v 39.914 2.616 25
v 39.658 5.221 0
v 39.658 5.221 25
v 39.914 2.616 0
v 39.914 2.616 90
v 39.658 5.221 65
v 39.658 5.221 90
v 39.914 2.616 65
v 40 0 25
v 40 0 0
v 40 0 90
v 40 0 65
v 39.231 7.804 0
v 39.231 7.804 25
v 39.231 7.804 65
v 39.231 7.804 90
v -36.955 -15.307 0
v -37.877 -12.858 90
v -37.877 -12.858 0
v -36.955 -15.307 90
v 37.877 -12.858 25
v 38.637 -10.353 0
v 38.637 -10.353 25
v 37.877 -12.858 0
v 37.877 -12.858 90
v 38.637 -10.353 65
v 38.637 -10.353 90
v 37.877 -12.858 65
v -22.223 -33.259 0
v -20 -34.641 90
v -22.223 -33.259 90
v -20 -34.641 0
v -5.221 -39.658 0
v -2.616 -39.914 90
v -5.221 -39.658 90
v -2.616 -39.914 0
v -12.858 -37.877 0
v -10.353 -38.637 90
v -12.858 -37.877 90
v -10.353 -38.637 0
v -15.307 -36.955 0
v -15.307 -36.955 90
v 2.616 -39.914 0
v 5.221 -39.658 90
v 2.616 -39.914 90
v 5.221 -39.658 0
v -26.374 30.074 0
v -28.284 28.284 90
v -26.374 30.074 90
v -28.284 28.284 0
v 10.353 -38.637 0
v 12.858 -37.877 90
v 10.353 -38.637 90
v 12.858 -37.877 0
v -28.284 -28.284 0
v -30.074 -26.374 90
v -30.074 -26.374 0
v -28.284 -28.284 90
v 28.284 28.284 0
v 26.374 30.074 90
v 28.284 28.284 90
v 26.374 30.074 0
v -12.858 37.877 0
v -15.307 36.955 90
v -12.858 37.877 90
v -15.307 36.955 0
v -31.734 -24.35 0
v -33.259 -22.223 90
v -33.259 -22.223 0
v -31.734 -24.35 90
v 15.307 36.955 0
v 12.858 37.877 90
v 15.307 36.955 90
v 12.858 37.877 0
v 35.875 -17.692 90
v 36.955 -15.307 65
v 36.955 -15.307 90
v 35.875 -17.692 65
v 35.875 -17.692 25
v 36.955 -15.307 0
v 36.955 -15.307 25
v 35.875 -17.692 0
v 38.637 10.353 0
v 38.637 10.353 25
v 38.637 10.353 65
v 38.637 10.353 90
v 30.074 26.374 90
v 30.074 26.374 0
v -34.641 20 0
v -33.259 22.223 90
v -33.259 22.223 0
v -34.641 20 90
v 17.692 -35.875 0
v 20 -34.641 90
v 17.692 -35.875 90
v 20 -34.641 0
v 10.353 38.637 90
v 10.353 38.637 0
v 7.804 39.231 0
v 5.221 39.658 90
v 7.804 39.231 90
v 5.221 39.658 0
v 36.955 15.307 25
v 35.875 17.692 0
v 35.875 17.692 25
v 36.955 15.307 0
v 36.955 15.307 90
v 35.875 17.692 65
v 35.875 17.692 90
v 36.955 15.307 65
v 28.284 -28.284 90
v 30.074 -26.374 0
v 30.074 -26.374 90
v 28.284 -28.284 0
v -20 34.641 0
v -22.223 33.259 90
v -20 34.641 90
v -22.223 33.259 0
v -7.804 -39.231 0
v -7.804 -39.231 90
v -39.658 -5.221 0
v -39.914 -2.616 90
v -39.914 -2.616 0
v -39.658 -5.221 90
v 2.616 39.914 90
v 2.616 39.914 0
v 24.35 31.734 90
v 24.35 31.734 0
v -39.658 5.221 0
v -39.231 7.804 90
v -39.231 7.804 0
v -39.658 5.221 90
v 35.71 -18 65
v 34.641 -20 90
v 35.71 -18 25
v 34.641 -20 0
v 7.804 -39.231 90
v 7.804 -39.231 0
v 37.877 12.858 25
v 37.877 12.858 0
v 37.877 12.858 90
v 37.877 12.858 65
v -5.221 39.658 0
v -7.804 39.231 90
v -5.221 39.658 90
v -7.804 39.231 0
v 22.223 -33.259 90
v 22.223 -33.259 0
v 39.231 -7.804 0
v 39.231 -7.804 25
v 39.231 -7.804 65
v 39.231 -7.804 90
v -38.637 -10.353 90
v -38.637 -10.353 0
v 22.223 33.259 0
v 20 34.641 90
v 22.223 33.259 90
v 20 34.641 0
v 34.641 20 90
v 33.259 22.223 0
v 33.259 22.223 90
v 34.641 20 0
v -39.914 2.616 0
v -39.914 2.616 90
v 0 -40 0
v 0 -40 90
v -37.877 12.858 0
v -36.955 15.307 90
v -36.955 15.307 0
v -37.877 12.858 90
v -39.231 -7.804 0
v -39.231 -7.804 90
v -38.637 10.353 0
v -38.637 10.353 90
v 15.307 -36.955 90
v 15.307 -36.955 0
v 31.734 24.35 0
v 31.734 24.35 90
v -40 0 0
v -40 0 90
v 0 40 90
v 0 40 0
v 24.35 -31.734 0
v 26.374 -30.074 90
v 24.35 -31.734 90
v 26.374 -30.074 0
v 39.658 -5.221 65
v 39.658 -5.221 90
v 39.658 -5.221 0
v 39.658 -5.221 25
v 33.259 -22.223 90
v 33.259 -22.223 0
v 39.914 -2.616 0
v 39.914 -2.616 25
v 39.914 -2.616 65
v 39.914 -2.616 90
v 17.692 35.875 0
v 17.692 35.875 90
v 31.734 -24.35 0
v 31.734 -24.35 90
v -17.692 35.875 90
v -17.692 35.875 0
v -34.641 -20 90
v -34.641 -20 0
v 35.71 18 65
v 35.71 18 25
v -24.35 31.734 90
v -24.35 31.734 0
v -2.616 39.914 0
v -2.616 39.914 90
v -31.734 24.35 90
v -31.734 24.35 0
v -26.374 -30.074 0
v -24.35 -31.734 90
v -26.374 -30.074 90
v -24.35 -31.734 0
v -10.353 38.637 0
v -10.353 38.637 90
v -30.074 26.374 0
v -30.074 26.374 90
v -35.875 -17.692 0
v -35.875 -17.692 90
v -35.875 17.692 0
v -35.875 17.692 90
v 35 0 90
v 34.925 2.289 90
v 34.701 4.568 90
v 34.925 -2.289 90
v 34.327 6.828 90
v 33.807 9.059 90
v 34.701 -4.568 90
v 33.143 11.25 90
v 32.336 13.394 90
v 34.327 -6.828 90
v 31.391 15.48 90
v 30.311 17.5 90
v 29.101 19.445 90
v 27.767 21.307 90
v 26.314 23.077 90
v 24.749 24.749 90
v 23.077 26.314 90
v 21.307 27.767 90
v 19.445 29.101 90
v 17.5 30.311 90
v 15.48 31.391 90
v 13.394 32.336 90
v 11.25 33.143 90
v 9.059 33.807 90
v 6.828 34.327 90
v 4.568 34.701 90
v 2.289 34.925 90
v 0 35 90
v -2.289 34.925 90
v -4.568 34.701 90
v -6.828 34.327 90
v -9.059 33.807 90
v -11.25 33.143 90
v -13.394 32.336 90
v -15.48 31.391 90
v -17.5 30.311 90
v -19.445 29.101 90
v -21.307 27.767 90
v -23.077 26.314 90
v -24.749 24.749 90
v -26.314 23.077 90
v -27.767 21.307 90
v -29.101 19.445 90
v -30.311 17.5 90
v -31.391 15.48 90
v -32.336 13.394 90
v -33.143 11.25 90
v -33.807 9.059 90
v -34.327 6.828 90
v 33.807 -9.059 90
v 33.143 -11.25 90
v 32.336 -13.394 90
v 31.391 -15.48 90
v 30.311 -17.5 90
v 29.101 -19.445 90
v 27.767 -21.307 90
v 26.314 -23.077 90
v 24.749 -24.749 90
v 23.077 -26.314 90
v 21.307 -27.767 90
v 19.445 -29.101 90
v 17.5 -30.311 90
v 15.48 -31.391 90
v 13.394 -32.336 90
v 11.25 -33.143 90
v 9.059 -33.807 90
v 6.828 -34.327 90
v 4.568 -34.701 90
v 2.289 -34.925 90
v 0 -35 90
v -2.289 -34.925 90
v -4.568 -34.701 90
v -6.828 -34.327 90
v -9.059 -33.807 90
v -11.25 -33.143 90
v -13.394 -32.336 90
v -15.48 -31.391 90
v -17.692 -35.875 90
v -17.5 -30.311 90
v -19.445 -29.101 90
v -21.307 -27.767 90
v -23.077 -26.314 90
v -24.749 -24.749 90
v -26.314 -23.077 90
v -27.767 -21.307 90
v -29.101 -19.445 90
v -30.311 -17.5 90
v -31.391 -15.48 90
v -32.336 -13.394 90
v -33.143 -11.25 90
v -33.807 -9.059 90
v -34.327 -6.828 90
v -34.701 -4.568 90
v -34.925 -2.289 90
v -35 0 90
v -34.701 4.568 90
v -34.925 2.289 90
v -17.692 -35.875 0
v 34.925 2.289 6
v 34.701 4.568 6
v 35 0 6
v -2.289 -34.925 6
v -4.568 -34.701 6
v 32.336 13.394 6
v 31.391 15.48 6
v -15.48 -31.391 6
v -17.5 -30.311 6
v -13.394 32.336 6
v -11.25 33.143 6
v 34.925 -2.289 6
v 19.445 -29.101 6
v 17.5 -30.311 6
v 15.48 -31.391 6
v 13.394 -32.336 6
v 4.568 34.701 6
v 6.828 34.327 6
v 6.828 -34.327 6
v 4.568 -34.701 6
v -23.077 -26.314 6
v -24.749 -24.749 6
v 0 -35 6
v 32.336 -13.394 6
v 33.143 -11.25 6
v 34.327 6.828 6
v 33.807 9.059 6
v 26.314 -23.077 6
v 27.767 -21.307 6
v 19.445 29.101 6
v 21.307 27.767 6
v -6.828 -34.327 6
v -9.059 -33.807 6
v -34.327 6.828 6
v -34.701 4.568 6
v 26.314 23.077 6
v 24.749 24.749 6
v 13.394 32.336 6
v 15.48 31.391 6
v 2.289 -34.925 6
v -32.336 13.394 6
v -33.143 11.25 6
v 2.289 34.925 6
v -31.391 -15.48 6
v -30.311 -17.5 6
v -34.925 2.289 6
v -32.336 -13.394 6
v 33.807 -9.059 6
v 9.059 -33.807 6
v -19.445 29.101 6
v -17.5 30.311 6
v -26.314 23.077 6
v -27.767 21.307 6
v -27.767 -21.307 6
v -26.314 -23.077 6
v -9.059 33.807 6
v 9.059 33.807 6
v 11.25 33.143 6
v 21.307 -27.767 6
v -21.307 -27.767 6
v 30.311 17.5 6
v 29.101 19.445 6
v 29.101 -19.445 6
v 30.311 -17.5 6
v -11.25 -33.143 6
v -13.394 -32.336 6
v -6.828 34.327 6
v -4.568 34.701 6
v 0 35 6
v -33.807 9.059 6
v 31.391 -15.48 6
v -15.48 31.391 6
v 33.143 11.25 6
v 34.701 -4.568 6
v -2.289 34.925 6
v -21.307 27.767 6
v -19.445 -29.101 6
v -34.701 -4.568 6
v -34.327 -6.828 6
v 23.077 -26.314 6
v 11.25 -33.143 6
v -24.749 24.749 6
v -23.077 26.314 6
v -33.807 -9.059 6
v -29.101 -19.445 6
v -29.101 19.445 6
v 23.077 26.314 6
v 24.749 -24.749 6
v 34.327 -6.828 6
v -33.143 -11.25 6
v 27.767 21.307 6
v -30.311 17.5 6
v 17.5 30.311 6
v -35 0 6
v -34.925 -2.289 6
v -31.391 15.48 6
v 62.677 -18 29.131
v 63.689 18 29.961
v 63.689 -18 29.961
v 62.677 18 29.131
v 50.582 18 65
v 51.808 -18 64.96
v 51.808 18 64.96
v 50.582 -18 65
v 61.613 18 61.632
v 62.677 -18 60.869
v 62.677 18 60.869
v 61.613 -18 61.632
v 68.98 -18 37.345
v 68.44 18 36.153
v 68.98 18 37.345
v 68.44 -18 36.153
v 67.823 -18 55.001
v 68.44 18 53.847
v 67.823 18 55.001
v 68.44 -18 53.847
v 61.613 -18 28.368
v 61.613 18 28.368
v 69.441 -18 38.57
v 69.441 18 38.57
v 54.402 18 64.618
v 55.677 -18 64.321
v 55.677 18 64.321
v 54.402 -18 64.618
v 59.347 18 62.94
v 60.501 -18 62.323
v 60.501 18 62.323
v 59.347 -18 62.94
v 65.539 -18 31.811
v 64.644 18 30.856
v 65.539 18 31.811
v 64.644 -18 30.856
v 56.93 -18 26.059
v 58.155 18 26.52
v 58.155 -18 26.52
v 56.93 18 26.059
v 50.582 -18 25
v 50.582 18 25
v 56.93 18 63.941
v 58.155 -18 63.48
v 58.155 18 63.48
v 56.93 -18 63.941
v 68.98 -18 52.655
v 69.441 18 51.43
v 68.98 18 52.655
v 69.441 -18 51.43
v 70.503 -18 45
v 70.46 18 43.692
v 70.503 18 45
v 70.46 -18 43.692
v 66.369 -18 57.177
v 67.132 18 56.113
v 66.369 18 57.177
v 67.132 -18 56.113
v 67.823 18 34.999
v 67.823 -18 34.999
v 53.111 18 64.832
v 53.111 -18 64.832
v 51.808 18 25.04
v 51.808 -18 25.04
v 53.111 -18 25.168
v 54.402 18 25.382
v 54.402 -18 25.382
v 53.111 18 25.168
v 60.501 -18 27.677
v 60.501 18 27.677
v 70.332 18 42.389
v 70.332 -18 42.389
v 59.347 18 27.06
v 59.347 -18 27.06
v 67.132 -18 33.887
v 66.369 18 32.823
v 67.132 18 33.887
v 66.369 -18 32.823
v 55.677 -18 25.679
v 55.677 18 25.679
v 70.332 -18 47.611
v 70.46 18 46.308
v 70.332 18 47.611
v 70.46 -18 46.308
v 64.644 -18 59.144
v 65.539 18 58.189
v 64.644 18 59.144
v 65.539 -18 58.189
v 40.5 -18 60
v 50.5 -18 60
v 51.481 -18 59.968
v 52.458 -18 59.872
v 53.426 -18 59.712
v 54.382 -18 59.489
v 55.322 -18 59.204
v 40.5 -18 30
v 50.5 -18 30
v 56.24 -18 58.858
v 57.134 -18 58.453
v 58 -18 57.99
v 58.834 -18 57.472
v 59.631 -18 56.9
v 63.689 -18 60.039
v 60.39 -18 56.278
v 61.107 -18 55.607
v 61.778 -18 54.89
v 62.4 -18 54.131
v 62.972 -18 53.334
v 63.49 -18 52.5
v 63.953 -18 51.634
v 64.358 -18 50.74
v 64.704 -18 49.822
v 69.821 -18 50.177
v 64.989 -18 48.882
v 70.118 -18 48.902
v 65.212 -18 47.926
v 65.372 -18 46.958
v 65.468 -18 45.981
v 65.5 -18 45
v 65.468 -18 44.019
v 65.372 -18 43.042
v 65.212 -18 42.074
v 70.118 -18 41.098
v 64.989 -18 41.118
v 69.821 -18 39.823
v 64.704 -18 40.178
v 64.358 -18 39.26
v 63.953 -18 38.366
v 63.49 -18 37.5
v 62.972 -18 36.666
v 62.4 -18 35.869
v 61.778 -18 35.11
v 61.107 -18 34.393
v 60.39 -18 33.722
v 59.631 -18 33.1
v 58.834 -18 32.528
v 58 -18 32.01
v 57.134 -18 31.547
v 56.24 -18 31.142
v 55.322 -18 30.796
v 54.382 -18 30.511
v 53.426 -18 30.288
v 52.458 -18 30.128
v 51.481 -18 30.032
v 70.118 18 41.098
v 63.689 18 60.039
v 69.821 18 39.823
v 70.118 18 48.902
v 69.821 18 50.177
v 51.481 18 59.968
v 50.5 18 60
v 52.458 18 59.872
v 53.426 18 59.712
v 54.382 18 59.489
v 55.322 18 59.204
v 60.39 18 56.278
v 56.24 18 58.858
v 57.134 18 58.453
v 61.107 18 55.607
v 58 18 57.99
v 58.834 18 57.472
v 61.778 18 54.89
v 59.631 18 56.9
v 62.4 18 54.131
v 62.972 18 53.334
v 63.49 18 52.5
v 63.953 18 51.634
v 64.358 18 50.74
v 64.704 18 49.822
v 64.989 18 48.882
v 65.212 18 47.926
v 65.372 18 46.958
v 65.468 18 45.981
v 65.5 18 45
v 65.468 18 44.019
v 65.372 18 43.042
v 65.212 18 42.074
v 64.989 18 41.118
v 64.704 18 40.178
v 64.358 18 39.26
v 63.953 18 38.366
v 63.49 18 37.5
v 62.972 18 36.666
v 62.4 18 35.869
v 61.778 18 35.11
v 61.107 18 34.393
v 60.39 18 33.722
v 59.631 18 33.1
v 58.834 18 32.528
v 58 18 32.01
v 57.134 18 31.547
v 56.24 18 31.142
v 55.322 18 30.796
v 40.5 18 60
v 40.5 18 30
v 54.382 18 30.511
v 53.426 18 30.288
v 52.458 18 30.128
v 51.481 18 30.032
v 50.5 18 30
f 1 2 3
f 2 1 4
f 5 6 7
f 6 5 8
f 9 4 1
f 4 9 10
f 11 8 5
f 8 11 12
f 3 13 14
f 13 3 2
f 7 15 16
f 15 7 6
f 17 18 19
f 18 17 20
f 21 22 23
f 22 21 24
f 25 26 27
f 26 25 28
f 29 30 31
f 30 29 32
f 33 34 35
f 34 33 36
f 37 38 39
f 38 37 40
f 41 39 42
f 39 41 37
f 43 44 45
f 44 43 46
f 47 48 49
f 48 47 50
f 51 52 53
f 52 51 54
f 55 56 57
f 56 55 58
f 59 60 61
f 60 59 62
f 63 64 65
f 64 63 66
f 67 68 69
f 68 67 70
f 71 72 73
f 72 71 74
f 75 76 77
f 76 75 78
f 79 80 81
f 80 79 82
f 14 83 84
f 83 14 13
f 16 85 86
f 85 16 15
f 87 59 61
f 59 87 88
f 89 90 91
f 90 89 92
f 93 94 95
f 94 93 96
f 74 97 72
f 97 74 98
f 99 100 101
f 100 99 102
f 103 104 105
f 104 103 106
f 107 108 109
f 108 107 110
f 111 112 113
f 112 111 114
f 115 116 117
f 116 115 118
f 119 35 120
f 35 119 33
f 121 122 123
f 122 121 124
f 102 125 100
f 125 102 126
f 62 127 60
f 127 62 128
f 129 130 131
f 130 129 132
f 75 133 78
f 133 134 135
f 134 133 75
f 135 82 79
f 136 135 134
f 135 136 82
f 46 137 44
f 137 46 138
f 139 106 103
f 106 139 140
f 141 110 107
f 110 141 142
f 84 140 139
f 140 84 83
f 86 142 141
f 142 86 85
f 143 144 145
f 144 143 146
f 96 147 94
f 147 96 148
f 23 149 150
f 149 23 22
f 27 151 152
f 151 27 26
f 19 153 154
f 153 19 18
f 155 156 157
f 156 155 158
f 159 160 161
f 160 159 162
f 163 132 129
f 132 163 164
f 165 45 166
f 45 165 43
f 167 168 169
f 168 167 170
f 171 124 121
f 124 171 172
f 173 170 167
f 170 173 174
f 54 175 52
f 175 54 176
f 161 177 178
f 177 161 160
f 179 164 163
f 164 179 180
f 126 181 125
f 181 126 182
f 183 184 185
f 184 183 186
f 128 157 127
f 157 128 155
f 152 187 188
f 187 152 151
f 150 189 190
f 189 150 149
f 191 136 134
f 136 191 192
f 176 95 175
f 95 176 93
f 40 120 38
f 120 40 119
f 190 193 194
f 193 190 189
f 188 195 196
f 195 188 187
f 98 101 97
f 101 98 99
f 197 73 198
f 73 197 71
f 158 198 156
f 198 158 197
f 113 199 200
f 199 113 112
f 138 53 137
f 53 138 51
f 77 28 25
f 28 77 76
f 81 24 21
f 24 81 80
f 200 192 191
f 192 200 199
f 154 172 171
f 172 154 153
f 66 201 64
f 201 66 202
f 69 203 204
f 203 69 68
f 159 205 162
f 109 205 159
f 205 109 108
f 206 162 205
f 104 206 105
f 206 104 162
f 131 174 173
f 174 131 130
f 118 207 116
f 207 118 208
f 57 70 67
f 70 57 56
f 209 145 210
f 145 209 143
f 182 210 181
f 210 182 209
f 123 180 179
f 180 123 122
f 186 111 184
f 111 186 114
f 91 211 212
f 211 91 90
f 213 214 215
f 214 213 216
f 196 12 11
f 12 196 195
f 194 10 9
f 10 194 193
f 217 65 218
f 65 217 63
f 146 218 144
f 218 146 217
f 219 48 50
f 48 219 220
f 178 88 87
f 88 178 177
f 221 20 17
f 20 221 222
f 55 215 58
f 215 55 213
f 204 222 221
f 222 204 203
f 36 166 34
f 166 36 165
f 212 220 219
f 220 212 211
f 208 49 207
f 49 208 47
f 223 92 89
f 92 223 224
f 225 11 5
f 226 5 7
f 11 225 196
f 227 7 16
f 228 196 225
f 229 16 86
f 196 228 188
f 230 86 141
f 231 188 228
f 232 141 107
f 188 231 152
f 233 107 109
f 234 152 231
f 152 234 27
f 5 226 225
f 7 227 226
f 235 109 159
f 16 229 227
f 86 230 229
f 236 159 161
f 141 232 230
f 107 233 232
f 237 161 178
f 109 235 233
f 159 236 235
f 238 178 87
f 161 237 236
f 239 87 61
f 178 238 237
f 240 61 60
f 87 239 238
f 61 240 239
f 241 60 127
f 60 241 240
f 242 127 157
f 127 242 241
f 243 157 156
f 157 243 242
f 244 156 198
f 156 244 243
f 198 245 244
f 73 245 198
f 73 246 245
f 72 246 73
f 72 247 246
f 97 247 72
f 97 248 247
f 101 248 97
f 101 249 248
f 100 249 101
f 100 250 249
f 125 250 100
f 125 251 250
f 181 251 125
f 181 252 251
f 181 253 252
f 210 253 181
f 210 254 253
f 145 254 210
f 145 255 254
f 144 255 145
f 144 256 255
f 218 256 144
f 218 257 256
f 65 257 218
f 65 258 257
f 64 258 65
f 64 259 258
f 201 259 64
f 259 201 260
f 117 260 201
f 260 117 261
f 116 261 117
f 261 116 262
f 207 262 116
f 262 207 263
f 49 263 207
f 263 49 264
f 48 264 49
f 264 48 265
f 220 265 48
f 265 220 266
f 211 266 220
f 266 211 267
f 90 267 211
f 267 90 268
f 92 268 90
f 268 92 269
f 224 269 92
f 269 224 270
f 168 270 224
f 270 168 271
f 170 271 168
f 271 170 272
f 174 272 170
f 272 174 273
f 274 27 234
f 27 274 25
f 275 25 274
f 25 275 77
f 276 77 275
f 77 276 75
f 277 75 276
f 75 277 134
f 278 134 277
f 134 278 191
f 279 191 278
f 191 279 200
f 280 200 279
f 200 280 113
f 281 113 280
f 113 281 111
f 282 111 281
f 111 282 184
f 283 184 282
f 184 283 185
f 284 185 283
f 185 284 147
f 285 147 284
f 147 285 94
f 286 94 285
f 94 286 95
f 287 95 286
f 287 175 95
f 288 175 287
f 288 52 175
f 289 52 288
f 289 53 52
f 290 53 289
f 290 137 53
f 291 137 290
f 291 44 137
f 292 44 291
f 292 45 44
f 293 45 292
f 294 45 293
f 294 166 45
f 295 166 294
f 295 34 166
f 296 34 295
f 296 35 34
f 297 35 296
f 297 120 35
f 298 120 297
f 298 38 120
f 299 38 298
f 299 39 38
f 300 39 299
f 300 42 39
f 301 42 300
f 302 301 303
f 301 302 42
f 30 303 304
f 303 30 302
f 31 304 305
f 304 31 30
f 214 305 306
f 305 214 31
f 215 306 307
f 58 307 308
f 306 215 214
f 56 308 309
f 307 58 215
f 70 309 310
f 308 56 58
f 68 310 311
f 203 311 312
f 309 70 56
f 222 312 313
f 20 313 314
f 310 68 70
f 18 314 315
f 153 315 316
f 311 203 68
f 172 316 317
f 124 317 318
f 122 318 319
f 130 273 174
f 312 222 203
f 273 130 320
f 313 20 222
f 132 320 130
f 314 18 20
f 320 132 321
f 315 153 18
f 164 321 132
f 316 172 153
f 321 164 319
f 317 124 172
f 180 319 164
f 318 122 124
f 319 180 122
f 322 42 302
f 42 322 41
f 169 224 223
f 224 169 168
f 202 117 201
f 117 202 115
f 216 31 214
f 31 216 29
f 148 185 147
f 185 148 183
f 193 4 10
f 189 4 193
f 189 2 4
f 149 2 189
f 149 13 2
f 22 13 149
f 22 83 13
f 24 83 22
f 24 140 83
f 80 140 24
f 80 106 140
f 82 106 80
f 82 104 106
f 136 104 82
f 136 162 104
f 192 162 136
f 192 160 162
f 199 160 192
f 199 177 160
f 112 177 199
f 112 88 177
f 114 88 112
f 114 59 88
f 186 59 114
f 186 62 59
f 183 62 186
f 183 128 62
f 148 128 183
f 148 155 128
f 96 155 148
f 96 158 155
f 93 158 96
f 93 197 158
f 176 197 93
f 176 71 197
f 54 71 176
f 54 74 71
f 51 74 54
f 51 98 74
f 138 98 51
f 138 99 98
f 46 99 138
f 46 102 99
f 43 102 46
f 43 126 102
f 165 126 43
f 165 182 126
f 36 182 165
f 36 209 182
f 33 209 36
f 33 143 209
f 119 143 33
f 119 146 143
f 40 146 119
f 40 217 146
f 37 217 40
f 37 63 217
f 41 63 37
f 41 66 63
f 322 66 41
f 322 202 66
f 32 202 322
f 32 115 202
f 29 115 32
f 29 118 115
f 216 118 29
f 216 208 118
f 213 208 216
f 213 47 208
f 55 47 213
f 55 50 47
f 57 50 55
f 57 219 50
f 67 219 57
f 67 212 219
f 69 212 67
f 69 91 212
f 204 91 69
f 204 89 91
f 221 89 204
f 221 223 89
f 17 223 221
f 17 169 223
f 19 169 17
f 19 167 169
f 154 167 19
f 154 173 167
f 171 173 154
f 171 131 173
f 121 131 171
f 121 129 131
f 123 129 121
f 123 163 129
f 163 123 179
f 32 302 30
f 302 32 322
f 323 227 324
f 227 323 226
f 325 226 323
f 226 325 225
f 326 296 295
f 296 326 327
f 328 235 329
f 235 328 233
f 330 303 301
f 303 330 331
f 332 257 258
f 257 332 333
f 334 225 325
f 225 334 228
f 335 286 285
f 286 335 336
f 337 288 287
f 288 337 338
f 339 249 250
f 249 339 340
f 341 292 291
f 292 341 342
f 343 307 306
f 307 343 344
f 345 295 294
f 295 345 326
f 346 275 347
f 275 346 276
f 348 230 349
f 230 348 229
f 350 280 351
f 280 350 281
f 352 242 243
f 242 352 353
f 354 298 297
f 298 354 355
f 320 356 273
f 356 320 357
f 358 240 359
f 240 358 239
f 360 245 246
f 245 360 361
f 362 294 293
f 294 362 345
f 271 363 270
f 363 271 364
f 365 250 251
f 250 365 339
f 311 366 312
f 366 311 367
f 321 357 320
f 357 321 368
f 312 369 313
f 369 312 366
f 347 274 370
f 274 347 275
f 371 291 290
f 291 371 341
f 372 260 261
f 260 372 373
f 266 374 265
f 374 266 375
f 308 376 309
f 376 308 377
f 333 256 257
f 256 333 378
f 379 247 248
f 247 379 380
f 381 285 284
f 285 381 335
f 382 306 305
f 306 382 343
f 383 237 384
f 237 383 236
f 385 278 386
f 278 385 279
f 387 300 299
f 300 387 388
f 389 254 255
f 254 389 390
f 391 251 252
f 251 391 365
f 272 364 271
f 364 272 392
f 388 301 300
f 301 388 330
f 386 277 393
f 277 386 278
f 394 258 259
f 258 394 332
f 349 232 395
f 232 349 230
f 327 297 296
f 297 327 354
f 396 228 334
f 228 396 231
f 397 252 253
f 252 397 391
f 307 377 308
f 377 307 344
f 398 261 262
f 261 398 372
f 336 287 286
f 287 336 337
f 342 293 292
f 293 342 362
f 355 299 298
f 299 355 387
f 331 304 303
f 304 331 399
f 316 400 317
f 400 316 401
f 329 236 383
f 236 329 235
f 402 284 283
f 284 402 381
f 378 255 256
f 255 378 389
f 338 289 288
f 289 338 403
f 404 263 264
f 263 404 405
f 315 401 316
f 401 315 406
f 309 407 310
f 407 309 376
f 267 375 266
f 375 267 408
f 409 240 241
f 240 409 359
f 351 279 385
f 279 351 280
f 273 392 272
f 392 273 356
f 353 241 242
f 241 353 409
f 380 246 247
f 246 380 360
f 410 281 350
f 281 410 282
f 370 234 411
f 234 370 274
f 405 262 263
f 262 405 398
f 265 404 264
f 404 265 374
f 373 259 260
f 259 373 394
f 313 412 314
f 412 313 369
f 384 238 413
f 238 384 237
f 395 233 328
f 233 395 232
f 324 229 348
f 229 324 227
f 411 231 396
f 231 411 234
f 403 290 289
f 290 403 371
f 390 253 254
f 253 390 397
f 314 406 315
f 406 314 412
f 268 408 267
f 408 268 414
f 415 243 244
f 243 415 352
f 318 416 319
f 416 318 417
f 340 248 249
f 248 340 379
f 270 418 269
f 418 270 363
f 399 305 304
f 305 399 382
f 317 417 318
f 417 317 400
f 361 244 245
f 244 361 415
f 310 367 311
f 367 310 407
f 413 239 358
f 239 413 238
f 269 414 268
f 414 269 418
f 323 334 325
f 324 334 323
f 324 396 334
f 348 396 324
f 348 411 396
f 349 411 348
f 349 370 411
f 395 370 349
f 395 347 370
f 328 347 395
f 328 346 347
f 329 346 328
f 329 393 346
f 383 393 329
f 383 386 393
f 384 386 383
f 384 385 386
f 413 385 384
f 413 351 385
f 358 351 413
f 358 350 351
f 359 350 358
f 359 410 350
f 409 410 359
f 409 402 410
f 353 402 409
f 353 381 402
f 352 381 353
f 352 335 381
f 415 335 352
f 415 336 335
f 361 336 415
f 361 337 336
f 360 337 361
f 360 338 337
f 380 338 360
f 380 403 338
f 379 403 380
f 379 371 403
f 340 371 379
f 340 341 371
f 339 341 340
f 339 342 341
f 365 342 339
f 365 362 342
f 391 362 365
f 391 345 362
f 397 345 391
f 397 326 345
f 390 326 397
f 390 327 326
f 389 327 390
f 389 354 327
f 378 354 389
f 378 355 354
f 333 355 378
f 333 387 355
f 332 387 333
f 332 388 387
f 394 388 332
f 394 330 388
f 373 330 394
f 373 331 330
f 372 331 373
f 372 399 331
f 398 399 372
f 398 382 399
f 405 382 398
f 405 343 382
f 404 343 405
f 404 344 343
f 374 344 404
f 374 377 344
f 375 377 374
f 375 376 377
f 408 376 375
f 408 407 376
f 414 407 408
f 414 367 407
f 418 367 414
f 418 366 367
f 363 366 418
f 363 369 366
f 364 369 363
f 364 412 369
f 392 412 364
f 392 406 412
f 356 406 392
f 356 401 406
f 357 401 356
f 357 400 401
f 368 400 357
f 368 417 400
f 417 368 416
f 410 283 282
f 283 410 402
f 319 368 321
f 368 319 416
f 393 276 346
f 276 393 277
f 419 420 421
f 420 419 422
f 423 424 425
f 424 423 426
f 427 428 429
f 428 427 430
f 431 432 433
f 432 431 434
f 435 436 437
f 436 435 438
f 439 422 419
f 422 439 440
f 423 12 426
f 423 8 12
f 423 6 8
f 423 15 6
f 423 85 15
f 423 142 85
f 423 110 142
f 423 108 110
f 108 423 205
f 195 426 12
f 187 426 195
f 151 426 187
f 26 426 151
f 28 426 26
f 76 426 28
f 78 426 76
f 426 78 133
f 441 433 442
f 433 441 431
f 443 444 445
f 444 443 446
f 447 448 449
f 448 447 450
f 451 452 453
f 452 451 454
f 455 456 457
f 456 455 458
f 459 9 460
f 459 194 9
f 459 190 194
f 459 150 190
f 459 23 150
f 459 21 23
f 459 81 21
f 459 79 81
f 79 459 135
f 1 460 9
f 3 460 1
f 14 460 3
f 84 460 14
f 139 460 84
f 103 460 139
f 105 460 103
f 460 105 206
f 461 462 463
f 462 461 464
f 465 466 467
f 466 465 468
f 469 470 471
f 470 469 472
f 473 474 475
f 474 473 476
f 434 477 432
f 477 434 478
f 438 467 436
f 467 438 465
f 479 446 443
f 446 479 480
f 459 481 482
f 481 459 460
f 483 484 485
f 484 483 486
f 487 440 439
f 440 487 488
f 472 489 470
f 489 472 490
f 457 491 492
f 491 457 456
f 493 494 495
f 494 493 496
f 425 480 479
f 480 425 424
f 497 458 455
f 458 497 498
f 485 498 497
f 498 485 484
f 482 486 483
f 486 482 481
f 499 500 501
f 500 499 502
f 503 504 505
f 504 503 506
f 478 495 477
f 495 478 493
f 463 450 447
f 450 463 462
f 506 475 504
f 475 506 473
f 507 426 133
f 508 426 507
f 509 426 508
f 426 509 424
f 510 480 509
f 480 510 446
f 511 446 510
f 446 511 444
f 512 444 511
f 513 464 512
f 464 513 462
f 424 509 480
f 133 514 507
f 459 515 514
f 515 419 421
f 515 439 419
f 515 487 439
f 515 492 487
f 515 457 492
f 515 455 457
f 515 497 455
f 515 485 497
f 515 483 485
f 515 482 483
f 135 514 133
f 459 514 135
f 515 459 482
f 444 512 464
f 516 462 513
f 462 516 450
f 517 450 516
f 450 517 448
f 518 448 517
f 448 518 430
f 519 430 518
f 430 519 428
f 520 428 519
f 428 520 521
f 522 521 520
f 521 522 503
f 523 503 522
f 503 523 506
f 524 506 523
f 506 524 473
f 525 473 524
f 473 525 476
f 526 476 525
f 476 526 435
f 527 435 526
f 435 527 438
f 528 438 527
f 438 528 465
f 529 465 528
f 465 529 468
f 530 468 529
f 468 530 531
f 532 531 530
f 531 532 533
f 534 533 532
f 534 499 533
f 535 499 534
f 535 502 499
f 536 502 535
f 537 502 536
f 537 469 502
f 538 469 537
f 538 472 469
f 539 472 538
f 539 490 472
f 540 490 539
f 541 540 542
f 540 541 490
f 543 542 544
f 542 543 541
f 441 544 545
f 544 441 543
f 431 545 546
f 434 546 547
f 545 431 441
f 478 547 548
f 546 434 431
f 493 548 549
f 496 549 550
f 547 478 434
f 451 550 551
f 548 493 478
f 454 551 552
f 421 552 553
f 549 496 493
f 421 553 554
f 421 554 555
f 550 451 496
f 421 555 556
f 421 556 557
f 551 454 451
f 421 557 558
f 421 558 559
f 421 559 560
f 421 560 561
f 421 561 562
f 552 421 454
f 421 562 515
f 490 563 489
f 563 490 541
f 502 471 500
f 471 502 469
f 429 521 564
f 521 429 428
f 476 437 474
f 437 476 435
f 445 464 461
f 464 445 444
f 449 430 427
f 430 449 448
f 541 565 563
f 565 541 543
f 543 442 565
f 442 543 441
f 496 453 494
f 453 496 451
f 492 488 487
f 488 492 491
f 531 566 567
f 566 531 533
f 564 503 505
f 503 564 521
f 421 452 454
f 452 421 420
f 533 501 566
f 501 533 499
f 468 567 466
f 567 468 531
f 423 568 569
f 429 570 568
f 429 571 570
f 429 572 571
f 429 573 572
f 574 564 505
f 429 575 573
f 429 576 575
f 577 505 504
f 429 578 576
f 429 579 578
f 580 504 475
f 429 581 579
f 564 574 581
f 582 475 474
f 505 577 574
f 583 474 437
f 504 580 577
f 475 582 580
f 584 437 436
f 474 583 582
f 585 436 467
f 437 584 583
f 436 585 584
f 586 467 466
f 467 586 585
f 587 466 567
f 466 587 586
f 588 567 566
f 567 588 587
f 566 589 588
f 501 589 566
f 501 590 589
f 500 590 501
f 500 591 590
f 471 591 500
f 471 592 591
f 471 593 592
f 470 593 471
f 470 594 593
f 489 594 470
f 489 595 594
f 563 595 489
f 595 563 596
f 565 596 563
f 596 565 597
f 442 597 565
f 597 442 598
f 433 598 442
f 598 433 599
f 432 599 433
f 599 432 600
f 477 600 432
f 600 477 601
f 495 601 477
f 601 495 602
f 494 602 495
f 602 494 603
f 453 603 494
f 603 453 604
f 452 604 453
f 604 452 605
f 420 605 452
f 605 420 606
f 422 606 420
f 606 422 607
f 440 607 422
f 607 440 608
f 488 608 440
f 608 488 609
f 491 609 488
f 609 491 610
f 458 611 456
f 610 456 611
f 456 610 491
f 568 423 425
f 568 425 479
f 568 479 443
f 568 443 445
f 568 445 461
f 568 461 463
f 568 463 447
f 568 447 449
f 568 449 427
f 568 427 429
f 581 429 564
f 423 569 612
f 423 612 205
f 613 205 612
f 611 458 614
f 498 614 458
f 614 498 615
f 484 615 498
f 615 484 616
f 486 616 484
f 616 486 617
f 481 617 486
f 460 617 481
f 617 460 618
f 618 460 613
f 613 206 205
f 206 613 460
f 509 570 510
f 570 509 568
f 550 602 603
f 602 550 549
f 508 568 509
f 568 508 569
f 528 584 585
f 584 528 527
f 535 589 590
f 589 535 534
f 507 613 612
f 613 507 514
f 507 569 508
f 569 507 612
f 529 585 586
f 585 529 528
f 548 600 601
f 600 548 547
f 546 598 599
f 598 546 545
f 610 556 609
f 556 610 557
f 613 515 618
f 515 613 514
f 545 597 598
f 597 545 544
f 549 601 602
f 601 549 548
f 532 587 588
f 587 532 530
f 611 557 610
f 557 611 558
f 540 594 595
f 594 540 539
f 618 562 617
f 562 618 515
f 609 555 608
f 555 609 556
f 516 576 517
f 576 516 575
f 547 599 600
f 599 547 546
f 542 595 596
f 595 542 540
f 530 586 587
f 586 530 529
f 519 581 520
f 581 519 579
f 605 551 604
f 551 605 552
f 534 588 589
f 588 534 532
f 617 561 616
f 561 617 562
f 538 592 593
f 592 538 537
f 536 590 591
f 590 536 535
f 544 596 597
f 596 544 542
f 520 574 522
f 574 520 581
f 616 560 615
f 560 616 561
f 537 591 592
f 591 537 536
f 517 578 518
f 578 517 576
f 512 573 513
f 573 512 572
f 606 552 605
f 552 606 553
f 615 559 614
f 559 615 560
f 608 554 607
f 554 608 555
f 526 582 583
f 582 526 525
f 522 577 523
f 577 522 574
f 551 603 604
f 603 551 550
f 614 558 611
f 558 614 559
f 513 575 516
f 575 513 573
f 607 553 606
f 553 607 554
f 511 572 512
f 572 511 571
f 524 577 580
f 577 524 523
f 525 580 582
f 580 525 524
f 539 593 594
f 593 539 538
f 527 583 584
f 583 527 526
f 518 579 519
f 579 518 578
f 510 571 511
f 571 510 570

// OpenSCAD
// Parameters
$fn = 96;

mug_od = 80;
mug_id = 70;
mug_h  = 90;
mug_bottom = 6;

handle_inner_w = 25; // inner D width (X) = 25 mm
handle_inner_h = 30; // inner D height (Z) = 30 mm
handle_wall_t  = 5;  // uniform wall thickness around inner D
handle_depth_y = 36; // thickness along Y (tangential)
handle_gap     = 0.5; // clearance between mug outer surface (R=40) and handle inner flat

// Mug body: outer cylinder minus inner cavity (leaving 6mm bottom)
module mug_body(od, id, h, bottom) {
    difference() {
        cylinder(d = od, h = h);
        translate([0, 0, bottom])
            cylinder(d = id, h = h - bottom + 0.02); // tiny extra to ensure open top
    }
}

// 2D inner D shape in XY-plane: X=radial, Y=vertical (will map to Z after rotation)
module d2d_inner(iw, ih) {
    r = ih/2;          // semicircle radius
    d = iw - r;        // rectangle width to make D profile
    intersection() {
        // Keep half-plane x >= 0
        translate([250, 0]) square([500, 500], center = true);
        union() {
            // rectangle from x=0..d, y=-r..r
            translate([d/2, 0]) square([d, ih], center = true);
            // semicircle (circle) on the right
            translate([d, 0]) circle(r = r);
        }
    }
}

// Handle: create 3D by extruding the 2D D profile along Z, then rotate to make extrusion along Y
module handle(iw, ih, wall_t, depth_y, mug_outer_r, z_center, gap) {
    // Place so INNER flat of the D sits at mug_outer_r + gap (clearance),
    // and OUTER flat embeds into the mug by wall_t - gap (<= wall_t), ensuring a solid union.
    dx = mug_outer_r + gap;

    translate([dx, 0, z_center])
        rotate([-90, 0, 0]) // Z(extrude) -> Y, Y(2D) -> -Z
            difference() {
                // Outer D: offset the inner D by wall thickness in 2D, then extrude along Z
                linear_extrude(height = depth_y, center = true)
                    offset(delta = wall_t) d2d_inner(iw, ih);
                // Subtract inner D to form the handle hole
                linear_extrude(height = depth_y + 0.4, center = true) // a bit taller for clean subtraction
                    d2d_inner(iw, ih);
            }
}

union() {
    mug_body(mug_od, mug_id, mug_h, mug_bottom);
    handle(handle_inner_w, handle_inner_h, handle_wall_t, handle_depth_y, mug_od/2, mug_h/2, handle_gap);
}
